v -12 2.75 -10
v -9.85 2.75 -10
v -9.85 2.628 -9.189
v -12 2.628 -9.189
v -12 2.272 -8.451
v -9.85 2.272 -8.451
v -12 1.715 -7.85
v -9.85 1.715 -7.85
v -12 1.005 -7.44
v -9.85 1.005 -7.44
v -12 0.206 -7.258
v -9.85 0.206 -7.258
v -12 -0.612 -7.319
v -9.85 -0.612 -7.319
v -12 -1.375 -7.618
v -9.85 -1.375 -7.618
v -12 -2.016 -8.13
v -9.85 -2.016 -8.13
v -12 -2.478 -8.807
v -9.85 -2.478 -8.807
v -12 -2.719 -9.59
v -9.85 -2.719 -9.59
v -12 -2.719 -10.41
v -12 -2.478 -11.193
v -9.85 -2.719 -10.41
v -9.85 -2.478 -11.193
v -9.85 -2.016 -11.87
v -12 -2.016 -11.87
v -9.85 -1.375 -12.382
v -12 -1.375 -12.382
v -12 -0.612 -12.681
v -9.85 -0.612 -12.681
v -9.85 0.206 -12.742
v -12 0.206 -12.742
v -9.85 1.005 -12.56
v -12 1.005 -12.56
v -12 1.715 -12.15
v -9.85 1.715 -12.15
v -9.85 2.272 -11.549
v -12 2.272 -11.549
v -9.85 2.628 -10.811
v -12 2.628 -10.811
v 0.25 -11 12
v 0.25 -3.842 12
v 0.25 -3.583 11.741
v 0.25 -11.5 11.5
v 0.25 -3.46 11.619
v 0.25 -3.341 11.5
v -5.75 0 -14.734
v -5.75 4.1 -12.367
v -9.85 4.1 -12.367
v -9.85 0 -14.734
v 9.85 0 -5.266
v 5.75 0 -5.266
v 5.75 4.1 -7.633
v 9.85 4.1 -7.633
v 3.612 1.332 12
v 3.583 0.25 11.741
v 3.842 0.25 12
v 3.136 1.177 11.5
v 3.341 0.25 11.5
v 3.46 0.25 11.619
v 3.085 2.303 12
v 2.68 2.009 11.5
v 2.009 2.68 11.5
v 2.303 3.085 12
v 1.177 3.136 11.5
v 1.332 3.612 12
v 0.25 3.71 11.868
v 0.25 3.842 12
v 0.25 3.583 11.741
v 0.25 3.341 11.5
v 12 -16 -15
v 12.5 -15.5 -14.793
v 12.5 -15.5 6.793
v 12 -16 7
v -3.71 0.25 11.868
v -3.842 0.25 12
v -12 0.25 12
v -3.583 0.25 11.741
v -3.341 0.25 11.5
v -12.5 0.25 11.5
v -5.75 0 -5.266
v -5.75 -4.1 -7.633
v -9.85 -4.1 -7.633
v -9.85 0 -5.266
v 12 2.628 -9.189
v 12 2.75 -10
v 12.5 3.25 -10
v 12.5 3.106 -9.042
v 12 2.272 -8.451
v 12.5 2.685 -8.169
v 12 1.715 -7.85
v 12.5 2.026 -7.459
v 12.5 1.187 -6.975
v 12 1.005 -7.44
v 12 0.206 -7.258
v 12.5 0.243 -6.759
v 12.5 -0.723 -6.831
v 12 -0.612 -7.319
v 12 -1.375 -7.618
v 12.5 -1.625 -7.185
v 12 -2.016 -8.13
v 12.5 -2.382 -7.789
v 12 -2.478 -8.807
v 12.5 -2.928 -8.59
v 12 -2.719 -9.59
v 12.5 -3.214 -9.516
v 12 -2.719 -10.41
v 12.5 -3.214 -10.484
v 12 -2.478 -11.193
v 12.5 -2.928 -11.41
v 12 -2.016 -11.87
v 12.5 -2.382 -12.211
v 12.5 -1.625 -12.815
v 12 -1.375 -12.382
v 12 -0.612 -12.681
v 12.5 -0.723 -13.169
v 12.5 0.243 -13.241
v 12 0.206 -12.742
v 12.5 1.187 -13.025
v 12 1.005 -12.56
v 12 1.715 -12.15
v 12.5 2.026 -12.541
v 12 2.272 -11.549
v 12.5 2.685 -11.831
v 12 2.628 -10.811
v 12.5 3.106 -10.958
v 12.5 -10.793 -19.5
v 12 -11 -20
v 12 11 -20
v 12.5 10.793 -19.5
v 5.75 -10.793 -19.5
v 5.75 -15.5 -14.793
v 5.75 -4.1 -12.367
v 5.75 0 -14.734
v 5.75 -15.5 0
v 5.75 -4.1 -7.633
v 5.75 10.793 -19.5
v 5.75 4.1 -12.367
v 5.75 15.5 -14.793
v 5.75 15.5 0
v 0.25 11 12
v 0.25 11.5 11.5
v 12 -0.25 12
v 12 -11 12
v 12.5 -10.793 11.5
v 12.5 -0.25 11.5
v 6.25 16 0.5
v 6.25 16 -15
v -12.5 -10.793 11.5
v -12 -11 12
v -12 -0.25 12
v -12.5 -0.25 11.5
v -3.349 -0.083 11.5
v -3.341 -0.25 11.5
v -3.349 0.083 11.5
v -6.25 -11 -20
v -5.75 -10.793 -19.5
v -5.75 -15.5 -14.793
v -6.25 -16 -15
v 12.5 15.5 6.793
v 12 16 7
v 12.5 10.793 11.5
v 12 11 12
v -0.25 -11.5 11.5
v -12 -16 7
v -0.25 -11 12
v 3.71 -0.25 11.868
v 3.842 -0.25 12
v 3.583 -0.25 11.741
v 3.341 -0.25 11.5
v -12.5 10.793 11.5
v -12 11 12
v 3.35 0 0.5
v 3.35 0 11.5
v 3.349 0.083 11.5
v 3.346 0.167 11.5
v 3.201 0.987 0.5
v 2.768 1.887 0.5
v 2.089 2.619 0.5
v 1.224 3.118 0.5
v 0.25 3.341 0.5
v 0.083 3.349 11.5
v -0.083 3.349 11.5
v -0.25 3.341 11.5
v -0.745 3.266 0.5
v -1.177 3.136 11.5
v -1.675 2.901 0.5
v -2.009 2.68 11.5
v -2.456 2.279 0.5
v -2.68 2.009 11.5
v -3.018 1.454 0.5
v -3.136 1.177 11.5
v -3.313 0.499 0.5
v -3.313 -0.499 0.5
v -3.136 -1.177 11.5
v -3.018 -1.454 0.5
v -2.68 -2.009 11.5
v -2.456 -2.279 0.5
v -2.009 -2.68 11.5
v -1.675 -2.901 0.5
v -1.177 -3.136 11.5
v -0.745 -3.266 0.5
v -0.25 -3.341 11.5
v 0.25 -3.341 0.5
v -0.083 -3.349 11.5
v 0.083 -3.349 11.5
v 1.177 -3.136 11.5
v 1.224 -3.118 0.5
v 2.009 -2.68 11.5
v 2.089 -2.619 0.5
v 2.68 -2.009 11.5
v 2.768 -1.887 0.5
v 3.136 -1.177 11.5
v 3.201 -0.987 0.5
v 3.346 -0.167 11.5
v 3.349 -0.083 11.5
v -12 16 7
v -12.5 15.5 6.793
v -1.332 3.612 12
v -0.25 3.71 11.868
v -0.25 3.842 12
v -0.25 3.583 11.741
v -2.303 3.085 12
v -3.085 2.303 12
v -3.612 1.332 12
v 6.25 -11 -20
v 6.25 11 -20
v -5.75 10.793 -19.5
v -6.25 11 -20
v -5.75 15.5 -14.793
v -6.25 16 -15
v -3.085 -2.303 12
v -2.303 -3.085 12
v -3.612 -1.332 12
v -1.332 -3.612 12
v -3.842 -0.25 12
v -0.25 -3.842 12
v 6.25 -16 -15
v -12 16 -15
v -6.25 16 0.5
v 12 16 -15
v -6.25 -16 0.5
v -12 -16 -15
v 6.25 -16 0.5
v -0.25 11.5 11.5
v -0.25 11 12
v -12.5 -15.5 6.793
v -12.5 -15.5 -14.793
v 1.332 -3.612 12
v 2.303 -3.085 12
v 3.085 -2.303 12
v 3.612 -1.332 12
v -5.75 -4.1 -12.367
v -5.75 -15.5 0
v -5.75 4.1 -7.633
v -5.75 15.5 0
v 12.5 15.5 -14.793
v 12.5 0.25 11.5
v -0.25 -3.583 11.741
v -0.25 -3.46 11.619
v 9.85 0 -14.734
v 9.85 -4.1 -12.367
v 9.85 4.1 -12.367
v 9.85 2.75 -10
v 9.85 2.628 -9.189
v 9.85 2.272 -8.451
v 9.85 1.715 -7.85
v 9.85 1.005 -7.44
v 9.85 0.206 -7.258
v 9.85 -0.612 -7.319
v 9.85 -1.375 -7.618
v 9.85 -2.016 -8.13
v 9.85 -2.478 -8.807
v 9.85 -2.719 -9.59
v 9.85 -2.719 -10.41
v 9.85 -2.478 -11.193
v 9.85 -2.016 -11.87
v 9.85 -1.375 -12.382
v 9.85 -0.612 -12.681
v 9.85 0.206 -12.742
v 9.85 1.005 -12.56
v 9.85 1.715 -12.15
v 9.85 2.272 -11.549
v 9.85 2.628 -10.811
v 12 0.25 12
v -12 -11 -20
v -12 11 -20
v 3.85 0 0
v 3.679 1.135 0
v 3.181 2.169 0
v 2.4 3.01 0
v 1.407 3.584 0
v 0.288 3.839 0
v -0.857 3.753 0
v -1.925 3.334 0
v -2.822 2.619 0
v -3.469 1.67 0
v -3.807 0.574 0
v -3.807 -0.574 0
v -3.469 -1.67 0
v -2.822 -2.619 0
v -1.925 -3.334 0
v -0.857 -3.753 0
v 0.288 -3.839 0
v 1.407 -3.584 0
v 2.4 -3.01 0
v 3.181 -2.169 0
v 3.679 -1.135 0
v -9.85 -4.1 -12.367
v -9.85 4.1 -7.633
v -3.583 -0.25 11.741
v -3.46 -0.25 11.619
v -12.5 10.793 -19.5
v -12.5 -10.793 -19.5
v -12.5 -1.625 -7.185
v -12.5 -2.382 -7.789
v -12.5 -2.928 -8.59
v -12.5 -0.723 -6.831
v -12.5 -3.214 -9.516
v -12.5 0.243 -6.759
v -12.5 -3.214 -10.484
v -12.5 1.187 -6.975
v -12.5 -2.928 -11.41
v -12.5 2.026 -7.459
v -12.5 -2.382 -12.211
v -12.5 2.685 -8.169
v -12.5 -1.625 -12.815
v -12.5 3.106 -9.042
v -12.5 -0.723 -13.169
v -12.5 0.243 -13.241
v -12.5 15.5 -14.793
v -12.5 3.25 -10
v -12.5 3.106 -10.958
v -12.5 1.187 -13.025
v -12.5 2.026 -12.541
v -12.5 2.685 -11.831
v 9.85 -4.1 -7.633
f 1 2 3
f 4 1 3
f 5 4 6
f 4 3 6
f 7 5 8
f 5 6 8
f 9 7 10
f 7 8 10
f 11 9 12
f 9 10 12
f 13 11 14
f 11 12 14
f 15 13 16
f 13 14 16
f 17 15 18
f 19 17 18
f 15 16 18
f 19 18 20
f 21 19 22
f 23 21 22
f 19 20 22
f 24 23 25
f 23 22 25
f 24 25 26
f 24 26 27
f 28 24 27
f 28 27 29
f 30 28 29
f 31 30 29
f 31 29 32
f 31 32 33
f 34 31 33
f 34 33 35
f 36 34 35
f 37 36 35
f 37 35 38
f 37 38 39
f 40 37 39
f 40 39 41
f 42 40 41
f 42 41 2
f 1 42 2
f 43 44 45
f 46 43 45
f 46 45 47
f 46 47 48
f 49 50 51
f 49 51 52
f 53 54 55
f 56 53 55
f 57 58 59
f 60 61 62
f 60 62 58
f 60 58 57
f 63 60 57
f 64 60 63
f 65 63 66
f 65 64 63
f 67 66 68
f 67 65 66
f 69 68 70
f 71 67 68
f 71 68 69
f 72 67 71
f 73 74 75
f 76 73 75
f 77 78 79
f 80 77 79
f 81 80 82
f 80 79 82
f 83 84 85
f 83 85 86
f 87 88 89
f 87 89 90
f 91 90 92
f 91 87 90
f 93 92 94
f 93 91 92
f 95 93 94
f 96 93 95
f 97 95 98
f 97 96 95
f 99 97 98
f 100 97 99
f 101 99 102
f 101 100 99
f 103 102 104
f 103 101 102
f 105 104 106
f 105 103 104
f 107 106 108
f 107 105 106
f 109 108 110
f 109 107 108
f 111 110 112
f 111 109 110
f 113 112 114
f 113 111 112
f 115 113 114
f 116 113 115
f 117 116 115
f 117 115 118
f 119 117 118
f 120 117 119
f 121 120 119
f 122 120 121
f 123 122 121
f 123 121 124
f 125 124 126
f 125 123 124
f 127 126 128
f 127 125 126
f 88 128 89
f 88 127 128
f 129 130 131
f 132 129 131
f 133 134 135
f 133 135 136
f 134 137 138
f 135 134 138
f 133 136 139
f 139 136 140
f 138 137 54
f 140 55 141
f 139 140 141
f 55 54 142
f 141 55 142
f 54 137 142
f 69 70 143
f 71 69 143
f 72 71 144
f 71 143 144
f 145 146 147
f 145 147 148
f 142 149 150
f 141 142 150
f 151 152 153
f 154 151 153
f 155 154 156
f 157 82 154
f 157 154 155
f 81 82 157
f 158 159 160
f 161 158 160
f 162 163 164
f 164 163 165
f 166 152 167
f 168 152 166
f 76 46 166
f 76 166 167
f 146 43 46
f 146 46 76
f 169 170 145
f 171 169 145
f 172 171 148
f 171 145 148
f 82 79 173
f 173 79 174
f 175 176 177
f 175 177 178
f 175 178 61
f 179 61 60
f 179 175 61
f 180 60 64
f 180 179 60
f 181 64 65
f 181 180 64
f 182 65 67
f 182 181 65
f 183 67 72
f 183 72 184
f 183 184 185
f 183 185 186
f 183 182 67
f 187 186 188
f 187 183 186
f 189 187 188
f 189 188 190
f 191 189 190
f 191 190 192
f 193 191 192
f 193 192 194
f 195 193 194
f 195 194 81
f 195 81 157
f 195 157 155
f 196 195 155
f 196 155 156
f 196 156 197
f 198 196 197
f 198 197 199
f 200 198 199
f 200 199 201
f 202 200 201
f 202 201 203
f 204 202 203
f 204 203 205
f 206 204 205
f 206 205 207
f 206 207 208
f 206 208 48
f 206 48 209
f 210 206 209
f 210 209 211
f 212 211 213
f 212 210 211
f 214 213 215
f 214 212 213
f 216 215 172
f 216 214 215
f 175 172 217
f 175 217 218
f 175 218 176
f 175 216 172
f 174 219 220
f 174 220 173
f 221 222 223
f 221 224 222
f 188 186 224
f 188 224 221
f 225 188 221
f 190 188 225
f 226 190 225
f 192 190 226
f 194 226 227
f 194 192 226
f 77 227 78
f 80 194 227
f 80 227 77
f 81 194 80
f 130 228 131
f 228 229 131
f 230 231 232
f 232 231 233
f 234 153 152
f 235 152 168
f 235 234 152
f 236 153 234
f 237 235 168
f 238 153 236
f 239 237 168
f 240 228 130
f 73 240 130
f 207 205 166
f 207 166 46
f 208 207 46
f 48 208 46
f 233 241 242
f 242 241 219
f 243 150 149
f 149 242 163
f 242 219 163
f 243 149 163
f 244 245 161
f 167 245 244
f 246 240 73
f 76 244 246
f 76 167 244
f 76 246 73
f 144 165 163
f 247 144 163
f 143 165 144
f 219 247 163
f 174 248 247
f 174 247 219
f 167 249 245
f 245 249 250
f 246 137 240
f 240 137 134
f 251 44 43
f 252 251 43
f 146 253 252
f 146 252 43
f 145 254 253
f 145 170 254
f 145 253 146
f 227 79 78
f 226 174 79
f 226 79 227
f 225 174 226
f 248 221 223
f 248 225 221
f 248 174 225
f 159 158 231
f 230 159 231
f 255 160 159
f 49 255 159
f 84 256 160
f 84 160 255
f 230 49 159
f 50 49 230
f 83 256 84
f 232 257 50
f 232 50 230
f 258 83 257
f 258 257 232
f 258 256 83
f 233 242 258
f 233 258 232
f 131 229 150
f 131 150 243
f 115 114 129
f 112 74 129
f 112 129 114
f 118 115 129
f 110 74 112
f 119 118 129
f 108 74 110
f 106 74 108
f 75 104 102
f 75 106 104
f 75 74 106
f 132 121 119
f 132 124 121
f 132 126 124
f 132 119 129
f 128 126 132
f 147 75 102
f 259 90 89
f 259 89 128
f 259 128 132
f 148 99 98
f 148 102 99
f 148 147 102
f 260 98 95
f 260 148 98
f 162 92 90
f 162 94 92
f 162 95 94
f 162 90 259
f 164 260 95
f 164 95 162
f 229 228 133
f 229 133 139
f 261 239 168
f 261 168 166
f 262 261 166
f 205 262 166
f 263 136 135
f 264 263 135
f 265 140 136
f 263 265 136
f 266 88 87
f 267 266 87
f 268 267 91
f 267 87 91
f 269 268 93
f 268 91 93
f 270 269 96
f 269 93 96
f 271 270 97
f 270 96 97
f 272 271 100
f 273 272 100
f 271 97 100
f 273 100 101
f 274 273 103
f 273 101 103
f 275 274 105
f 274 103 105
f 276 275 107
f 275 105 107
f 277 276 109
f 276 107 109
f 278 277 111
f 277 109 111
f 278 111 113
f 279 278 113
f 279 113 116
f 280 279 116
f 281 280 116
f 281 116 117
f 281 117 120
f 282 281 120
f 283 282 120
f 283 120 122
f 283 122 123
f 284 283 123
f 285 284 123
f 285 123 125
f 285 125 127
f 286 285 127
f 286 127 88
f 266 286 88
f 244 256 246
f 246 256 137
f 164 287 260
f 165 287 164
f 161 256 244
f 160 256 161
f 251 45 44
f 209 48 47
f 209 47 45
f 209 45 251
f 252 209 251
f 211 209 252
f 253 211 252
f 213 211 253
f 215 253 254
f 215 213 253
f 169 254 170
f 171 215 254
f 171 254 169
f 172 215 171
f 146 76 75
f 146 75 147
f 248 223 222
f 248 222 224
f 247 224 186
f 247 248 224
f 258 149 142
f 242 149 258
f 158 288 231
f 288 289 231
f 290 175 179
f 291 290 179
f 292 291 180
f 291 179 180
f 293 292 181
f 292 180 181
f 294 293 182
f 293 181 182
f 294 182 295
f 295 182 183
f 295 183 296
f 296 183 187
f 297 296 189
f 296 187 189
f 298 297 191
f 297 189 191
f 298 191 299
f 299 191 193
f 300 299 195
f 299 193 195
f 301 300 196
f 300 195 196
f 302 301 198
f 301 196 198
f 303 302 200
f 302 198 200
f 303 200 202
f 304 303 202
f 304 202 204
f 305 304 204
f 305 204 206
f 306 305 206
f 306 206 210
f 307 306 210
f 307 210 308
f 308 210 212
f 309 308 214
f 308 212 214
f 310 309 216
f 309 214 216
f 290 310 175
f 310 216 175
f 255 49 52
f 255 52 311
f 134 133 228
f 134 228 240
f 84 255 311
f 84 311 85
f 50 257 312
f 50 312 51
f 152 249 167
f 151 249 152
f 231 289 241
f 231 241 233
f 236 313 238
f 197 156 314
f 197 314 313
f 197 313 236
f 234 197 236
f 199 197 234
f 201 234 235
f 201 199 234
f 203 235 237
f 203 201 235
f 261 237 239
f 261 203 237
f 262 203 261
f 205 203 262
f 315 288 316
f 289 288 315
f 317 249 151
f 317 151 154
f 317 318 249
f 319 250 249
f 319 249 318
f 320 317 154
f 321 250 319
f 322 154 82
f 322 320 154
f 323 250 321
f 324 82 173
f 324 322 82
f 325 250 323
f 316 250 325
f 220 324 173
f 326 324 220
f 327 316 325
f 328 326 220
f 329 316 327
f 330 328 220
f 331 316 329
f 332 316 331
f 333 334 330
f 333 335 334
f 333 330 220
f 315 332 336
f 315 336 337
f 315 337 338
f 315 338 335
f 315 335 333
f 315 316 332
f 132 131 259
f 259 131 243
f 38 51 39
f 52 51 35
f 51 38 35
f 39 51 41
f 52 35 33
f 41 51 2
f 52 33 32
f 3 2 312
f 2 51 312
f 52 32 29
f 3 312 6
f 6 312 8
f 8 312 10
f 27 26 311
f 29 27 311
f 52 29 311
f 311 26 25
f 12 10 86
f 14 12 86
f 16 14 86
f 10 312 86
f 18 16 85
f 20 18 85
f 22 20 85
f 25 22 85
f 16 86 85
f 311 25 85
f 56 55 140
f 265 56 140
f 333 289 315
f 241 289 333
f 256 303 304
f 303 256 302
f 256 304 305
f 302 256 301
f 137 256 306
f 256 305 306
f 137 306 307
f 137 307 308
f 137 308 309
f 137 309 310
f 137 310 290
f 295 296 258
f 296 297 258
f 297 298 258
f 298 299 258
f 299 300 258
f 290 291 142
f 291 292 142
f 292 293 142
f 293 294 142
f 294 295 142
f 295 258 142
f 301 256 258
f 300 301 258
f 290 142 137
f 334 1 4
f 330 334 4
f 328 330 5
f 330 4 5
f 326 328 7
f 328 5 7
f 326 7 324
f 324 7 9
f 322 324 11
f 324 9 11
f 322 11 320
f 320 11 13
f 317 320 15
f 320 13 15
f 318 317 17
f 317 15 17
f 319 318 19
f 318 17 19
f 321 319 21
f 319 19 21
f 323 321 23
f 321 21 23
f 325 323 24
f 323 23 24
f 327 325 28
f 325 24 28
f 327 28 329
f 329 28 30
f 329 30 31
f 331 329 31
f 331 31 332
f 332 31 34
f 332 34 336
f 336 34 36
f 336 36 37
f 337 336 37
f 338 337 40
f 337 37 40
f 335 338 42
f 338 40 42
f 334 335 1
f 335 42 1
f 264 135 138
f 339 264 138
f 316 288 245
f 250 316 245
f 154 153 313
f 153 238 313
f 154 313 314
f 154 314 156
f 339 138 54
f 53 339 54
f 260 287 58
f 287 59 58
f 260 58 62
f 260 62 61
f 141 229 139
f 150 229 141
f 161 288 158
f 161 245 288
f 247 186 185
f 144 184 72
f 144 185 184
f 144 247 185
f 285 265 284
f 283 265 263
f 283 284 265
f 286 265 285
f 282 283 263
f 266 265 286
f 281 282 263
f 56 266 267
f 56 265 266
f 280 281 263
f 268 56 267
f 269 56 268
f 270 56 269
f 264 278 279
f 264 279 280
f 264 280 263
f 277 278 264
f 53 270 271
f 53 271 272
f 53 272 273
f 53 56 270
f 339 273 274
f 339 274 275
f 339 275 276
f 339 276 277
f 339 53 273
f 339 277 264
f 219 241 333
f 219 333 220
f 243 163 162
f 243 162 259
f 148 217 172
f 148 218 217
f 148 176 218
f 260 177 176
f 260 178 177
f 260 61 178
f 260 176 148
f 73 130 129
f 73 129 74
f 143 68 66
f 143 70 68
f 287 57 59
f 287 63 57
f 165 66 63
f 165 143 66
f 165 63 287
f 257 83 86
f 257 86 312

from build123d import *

# Parameters (mm, degrees)
F0_W      = 6.75
F0_H      = 32
F0_W_2    = 11.5
F0_R      = 3.35
F1_DEPTH  = 12
F2_DEPTH  = 20
F3_SIZE   = 5
F4_SIZE   = 5
F6_D      = 5.5
F8_DEPTH  = 4.1
F10_SIZE  = 0.5
F9_W      = 12.25
F9_H      = 0.5
F9_W_2    = 0.5
F9_H_2    = 15.75
F11_DEPTH = 0.5


# Not quite as in the source:
# - a pattern or mirror of a feature is missing from the dataset's text; its kind, count and spacing are read off the source's solid


with BuildPart() as f1:
    # F0 (on Top) → F1 (new body)
    with BuildSketch(Plane.XY):
        with Locations((9.125, 0)):
            Rectangle(F0_W, F0_H)
        Rectangle(F0_W_2, F0_H)
        Circle(F0_R, mode=Mode.SUBTRACT)
        with Locations((-9.125, 0)):
            Rectangle(F0_W, F0_H)
    extrude(amount=F1_DEPTH)

    # F0 (on Top) → F2 (join)
    with BuildSketch(Plane.XY):
        with Locations((9.125, 0)):
            Rectangle(F0_W, F0_H)
        with Locations((-9.125, 0)):
            Rectangle(F0_W, F0_H)
    extrude(amount=-F2_DEPTH)

    # F3
    f3_edges = [f1.edges().sort_by_distance(p)[0] for p in [
        (-9.125, -16, -20),
        (9.125, -16, -20),
        (9.125, 16, -20),
        (-9.125, 16, -20),
    ]]
    chamfer(f3_edges, length=F3_SIZE)

    # F4
    f4_edges = [f1.edges().sort_by_distance(p)[0] for p in [
        (0, -16, 12),
        (0, 16, 12),
    ]]
    chamfer(f4_edges, length=F4_SIZE)

    # F6 (through all)
    with Locations(Plane(origin=(-12.5, 0, 0), x_dir=(0, -1, 0), z_dir=(-1, 0, 0))):
        with Locations((0, -10)):
            Hole(F6_D / 2)

    # F7 (on face) → F8 (cut)
    with BuildSketch(Plane(origin=(5.75, 0, 0), x_dir=(0, -1, 0), z_dir=(-1, 0, 0))):
        Polygon((4.1, -12.3671361037), (4.1, -7.6328638963), (0, -5.2657277926), (-4.1, -7.6328638963), (-4.1, -12.3671361037), (0, -14.7342722074), align=None)
    f8 = extrude(amount=-F8_DEPTH, mode=Mode.SUBTRACT)

    # F8_copies: F8 across plane
    add(f8.mirror(Plane(origin=(0, 0, 0), x_dir=(0, 0, -1), z_dir=(-1, 0, 0))), mode=Mode.SUBTRACT)

    # F10
    f10_edges = [f1.edges().sort_by_distance(p)[0] for p in [
        (12.5, 0, 12),
        (12.5, -13.5, 9.5),
        (12.5, -16, -4),
        (12.5, -13.5, -17.5),
        (12.5, 0, -20),
        (12.5, 13.5, -17.5),
        (12.5, 16, -4),
        (12.5, 13.5, 9.5),
        (-12.5, -16, -4),
        (-12.5, -13.5, 9.5),
        (-12.5, -13.5, -17.5),
        (-12.5, 0, 12),
        (-12.5, 0, -20),
        (-12.5, 13.5, 9.5),
        (-12.5, 13.5, -17.5),
        (-12.5, 16, -4),
        (-12.5, 2.75, -10),
        (0, 16, 0),
        (0, -16, 0),
        (5.75, -16, -7.5),
        (5.75, -13.5, -17.5),
        (5.75, 0, -20),
        (5.75, 13.5, -17.5),
        (5.75, 16, -7.5),
        (-5.75, 16, -7.5),
        (-5.75, 13.5, -17.5),
        (-5.75, 0, -20),
        (-5.75, -13.5, -17.5),
        (-5.75, -16, -7.5),
        (-3.35, 0, 12),
        (-3.35, 0, 0),
        (12.5, 2.75, -10),
    ]]
    chamfer(f10_edges, length=F10_SIZE)

    # F9 (on face) → F11 (cut)
    with BuildSketch(Plane.XY.offset(12)):
        with Locations((-6.375, 0)):
            Rectangle(F9_W, F9_H)
        Rectangle(F9_W_2, F9_H)
        with Locations((0, -8.125)):
            Rectangle(F9_W_2, F9_H_2)
        with Locations((6.375, 0)):
            Rectangle(F9_W, F9_H)
        with Locations((0, 8.125)):
            Rectangle(F9_W_2, F9_H_2)
    extrude(amount=-F11_DEPTH, mode=Mode.SUBTRACT)


solid = f1.part
